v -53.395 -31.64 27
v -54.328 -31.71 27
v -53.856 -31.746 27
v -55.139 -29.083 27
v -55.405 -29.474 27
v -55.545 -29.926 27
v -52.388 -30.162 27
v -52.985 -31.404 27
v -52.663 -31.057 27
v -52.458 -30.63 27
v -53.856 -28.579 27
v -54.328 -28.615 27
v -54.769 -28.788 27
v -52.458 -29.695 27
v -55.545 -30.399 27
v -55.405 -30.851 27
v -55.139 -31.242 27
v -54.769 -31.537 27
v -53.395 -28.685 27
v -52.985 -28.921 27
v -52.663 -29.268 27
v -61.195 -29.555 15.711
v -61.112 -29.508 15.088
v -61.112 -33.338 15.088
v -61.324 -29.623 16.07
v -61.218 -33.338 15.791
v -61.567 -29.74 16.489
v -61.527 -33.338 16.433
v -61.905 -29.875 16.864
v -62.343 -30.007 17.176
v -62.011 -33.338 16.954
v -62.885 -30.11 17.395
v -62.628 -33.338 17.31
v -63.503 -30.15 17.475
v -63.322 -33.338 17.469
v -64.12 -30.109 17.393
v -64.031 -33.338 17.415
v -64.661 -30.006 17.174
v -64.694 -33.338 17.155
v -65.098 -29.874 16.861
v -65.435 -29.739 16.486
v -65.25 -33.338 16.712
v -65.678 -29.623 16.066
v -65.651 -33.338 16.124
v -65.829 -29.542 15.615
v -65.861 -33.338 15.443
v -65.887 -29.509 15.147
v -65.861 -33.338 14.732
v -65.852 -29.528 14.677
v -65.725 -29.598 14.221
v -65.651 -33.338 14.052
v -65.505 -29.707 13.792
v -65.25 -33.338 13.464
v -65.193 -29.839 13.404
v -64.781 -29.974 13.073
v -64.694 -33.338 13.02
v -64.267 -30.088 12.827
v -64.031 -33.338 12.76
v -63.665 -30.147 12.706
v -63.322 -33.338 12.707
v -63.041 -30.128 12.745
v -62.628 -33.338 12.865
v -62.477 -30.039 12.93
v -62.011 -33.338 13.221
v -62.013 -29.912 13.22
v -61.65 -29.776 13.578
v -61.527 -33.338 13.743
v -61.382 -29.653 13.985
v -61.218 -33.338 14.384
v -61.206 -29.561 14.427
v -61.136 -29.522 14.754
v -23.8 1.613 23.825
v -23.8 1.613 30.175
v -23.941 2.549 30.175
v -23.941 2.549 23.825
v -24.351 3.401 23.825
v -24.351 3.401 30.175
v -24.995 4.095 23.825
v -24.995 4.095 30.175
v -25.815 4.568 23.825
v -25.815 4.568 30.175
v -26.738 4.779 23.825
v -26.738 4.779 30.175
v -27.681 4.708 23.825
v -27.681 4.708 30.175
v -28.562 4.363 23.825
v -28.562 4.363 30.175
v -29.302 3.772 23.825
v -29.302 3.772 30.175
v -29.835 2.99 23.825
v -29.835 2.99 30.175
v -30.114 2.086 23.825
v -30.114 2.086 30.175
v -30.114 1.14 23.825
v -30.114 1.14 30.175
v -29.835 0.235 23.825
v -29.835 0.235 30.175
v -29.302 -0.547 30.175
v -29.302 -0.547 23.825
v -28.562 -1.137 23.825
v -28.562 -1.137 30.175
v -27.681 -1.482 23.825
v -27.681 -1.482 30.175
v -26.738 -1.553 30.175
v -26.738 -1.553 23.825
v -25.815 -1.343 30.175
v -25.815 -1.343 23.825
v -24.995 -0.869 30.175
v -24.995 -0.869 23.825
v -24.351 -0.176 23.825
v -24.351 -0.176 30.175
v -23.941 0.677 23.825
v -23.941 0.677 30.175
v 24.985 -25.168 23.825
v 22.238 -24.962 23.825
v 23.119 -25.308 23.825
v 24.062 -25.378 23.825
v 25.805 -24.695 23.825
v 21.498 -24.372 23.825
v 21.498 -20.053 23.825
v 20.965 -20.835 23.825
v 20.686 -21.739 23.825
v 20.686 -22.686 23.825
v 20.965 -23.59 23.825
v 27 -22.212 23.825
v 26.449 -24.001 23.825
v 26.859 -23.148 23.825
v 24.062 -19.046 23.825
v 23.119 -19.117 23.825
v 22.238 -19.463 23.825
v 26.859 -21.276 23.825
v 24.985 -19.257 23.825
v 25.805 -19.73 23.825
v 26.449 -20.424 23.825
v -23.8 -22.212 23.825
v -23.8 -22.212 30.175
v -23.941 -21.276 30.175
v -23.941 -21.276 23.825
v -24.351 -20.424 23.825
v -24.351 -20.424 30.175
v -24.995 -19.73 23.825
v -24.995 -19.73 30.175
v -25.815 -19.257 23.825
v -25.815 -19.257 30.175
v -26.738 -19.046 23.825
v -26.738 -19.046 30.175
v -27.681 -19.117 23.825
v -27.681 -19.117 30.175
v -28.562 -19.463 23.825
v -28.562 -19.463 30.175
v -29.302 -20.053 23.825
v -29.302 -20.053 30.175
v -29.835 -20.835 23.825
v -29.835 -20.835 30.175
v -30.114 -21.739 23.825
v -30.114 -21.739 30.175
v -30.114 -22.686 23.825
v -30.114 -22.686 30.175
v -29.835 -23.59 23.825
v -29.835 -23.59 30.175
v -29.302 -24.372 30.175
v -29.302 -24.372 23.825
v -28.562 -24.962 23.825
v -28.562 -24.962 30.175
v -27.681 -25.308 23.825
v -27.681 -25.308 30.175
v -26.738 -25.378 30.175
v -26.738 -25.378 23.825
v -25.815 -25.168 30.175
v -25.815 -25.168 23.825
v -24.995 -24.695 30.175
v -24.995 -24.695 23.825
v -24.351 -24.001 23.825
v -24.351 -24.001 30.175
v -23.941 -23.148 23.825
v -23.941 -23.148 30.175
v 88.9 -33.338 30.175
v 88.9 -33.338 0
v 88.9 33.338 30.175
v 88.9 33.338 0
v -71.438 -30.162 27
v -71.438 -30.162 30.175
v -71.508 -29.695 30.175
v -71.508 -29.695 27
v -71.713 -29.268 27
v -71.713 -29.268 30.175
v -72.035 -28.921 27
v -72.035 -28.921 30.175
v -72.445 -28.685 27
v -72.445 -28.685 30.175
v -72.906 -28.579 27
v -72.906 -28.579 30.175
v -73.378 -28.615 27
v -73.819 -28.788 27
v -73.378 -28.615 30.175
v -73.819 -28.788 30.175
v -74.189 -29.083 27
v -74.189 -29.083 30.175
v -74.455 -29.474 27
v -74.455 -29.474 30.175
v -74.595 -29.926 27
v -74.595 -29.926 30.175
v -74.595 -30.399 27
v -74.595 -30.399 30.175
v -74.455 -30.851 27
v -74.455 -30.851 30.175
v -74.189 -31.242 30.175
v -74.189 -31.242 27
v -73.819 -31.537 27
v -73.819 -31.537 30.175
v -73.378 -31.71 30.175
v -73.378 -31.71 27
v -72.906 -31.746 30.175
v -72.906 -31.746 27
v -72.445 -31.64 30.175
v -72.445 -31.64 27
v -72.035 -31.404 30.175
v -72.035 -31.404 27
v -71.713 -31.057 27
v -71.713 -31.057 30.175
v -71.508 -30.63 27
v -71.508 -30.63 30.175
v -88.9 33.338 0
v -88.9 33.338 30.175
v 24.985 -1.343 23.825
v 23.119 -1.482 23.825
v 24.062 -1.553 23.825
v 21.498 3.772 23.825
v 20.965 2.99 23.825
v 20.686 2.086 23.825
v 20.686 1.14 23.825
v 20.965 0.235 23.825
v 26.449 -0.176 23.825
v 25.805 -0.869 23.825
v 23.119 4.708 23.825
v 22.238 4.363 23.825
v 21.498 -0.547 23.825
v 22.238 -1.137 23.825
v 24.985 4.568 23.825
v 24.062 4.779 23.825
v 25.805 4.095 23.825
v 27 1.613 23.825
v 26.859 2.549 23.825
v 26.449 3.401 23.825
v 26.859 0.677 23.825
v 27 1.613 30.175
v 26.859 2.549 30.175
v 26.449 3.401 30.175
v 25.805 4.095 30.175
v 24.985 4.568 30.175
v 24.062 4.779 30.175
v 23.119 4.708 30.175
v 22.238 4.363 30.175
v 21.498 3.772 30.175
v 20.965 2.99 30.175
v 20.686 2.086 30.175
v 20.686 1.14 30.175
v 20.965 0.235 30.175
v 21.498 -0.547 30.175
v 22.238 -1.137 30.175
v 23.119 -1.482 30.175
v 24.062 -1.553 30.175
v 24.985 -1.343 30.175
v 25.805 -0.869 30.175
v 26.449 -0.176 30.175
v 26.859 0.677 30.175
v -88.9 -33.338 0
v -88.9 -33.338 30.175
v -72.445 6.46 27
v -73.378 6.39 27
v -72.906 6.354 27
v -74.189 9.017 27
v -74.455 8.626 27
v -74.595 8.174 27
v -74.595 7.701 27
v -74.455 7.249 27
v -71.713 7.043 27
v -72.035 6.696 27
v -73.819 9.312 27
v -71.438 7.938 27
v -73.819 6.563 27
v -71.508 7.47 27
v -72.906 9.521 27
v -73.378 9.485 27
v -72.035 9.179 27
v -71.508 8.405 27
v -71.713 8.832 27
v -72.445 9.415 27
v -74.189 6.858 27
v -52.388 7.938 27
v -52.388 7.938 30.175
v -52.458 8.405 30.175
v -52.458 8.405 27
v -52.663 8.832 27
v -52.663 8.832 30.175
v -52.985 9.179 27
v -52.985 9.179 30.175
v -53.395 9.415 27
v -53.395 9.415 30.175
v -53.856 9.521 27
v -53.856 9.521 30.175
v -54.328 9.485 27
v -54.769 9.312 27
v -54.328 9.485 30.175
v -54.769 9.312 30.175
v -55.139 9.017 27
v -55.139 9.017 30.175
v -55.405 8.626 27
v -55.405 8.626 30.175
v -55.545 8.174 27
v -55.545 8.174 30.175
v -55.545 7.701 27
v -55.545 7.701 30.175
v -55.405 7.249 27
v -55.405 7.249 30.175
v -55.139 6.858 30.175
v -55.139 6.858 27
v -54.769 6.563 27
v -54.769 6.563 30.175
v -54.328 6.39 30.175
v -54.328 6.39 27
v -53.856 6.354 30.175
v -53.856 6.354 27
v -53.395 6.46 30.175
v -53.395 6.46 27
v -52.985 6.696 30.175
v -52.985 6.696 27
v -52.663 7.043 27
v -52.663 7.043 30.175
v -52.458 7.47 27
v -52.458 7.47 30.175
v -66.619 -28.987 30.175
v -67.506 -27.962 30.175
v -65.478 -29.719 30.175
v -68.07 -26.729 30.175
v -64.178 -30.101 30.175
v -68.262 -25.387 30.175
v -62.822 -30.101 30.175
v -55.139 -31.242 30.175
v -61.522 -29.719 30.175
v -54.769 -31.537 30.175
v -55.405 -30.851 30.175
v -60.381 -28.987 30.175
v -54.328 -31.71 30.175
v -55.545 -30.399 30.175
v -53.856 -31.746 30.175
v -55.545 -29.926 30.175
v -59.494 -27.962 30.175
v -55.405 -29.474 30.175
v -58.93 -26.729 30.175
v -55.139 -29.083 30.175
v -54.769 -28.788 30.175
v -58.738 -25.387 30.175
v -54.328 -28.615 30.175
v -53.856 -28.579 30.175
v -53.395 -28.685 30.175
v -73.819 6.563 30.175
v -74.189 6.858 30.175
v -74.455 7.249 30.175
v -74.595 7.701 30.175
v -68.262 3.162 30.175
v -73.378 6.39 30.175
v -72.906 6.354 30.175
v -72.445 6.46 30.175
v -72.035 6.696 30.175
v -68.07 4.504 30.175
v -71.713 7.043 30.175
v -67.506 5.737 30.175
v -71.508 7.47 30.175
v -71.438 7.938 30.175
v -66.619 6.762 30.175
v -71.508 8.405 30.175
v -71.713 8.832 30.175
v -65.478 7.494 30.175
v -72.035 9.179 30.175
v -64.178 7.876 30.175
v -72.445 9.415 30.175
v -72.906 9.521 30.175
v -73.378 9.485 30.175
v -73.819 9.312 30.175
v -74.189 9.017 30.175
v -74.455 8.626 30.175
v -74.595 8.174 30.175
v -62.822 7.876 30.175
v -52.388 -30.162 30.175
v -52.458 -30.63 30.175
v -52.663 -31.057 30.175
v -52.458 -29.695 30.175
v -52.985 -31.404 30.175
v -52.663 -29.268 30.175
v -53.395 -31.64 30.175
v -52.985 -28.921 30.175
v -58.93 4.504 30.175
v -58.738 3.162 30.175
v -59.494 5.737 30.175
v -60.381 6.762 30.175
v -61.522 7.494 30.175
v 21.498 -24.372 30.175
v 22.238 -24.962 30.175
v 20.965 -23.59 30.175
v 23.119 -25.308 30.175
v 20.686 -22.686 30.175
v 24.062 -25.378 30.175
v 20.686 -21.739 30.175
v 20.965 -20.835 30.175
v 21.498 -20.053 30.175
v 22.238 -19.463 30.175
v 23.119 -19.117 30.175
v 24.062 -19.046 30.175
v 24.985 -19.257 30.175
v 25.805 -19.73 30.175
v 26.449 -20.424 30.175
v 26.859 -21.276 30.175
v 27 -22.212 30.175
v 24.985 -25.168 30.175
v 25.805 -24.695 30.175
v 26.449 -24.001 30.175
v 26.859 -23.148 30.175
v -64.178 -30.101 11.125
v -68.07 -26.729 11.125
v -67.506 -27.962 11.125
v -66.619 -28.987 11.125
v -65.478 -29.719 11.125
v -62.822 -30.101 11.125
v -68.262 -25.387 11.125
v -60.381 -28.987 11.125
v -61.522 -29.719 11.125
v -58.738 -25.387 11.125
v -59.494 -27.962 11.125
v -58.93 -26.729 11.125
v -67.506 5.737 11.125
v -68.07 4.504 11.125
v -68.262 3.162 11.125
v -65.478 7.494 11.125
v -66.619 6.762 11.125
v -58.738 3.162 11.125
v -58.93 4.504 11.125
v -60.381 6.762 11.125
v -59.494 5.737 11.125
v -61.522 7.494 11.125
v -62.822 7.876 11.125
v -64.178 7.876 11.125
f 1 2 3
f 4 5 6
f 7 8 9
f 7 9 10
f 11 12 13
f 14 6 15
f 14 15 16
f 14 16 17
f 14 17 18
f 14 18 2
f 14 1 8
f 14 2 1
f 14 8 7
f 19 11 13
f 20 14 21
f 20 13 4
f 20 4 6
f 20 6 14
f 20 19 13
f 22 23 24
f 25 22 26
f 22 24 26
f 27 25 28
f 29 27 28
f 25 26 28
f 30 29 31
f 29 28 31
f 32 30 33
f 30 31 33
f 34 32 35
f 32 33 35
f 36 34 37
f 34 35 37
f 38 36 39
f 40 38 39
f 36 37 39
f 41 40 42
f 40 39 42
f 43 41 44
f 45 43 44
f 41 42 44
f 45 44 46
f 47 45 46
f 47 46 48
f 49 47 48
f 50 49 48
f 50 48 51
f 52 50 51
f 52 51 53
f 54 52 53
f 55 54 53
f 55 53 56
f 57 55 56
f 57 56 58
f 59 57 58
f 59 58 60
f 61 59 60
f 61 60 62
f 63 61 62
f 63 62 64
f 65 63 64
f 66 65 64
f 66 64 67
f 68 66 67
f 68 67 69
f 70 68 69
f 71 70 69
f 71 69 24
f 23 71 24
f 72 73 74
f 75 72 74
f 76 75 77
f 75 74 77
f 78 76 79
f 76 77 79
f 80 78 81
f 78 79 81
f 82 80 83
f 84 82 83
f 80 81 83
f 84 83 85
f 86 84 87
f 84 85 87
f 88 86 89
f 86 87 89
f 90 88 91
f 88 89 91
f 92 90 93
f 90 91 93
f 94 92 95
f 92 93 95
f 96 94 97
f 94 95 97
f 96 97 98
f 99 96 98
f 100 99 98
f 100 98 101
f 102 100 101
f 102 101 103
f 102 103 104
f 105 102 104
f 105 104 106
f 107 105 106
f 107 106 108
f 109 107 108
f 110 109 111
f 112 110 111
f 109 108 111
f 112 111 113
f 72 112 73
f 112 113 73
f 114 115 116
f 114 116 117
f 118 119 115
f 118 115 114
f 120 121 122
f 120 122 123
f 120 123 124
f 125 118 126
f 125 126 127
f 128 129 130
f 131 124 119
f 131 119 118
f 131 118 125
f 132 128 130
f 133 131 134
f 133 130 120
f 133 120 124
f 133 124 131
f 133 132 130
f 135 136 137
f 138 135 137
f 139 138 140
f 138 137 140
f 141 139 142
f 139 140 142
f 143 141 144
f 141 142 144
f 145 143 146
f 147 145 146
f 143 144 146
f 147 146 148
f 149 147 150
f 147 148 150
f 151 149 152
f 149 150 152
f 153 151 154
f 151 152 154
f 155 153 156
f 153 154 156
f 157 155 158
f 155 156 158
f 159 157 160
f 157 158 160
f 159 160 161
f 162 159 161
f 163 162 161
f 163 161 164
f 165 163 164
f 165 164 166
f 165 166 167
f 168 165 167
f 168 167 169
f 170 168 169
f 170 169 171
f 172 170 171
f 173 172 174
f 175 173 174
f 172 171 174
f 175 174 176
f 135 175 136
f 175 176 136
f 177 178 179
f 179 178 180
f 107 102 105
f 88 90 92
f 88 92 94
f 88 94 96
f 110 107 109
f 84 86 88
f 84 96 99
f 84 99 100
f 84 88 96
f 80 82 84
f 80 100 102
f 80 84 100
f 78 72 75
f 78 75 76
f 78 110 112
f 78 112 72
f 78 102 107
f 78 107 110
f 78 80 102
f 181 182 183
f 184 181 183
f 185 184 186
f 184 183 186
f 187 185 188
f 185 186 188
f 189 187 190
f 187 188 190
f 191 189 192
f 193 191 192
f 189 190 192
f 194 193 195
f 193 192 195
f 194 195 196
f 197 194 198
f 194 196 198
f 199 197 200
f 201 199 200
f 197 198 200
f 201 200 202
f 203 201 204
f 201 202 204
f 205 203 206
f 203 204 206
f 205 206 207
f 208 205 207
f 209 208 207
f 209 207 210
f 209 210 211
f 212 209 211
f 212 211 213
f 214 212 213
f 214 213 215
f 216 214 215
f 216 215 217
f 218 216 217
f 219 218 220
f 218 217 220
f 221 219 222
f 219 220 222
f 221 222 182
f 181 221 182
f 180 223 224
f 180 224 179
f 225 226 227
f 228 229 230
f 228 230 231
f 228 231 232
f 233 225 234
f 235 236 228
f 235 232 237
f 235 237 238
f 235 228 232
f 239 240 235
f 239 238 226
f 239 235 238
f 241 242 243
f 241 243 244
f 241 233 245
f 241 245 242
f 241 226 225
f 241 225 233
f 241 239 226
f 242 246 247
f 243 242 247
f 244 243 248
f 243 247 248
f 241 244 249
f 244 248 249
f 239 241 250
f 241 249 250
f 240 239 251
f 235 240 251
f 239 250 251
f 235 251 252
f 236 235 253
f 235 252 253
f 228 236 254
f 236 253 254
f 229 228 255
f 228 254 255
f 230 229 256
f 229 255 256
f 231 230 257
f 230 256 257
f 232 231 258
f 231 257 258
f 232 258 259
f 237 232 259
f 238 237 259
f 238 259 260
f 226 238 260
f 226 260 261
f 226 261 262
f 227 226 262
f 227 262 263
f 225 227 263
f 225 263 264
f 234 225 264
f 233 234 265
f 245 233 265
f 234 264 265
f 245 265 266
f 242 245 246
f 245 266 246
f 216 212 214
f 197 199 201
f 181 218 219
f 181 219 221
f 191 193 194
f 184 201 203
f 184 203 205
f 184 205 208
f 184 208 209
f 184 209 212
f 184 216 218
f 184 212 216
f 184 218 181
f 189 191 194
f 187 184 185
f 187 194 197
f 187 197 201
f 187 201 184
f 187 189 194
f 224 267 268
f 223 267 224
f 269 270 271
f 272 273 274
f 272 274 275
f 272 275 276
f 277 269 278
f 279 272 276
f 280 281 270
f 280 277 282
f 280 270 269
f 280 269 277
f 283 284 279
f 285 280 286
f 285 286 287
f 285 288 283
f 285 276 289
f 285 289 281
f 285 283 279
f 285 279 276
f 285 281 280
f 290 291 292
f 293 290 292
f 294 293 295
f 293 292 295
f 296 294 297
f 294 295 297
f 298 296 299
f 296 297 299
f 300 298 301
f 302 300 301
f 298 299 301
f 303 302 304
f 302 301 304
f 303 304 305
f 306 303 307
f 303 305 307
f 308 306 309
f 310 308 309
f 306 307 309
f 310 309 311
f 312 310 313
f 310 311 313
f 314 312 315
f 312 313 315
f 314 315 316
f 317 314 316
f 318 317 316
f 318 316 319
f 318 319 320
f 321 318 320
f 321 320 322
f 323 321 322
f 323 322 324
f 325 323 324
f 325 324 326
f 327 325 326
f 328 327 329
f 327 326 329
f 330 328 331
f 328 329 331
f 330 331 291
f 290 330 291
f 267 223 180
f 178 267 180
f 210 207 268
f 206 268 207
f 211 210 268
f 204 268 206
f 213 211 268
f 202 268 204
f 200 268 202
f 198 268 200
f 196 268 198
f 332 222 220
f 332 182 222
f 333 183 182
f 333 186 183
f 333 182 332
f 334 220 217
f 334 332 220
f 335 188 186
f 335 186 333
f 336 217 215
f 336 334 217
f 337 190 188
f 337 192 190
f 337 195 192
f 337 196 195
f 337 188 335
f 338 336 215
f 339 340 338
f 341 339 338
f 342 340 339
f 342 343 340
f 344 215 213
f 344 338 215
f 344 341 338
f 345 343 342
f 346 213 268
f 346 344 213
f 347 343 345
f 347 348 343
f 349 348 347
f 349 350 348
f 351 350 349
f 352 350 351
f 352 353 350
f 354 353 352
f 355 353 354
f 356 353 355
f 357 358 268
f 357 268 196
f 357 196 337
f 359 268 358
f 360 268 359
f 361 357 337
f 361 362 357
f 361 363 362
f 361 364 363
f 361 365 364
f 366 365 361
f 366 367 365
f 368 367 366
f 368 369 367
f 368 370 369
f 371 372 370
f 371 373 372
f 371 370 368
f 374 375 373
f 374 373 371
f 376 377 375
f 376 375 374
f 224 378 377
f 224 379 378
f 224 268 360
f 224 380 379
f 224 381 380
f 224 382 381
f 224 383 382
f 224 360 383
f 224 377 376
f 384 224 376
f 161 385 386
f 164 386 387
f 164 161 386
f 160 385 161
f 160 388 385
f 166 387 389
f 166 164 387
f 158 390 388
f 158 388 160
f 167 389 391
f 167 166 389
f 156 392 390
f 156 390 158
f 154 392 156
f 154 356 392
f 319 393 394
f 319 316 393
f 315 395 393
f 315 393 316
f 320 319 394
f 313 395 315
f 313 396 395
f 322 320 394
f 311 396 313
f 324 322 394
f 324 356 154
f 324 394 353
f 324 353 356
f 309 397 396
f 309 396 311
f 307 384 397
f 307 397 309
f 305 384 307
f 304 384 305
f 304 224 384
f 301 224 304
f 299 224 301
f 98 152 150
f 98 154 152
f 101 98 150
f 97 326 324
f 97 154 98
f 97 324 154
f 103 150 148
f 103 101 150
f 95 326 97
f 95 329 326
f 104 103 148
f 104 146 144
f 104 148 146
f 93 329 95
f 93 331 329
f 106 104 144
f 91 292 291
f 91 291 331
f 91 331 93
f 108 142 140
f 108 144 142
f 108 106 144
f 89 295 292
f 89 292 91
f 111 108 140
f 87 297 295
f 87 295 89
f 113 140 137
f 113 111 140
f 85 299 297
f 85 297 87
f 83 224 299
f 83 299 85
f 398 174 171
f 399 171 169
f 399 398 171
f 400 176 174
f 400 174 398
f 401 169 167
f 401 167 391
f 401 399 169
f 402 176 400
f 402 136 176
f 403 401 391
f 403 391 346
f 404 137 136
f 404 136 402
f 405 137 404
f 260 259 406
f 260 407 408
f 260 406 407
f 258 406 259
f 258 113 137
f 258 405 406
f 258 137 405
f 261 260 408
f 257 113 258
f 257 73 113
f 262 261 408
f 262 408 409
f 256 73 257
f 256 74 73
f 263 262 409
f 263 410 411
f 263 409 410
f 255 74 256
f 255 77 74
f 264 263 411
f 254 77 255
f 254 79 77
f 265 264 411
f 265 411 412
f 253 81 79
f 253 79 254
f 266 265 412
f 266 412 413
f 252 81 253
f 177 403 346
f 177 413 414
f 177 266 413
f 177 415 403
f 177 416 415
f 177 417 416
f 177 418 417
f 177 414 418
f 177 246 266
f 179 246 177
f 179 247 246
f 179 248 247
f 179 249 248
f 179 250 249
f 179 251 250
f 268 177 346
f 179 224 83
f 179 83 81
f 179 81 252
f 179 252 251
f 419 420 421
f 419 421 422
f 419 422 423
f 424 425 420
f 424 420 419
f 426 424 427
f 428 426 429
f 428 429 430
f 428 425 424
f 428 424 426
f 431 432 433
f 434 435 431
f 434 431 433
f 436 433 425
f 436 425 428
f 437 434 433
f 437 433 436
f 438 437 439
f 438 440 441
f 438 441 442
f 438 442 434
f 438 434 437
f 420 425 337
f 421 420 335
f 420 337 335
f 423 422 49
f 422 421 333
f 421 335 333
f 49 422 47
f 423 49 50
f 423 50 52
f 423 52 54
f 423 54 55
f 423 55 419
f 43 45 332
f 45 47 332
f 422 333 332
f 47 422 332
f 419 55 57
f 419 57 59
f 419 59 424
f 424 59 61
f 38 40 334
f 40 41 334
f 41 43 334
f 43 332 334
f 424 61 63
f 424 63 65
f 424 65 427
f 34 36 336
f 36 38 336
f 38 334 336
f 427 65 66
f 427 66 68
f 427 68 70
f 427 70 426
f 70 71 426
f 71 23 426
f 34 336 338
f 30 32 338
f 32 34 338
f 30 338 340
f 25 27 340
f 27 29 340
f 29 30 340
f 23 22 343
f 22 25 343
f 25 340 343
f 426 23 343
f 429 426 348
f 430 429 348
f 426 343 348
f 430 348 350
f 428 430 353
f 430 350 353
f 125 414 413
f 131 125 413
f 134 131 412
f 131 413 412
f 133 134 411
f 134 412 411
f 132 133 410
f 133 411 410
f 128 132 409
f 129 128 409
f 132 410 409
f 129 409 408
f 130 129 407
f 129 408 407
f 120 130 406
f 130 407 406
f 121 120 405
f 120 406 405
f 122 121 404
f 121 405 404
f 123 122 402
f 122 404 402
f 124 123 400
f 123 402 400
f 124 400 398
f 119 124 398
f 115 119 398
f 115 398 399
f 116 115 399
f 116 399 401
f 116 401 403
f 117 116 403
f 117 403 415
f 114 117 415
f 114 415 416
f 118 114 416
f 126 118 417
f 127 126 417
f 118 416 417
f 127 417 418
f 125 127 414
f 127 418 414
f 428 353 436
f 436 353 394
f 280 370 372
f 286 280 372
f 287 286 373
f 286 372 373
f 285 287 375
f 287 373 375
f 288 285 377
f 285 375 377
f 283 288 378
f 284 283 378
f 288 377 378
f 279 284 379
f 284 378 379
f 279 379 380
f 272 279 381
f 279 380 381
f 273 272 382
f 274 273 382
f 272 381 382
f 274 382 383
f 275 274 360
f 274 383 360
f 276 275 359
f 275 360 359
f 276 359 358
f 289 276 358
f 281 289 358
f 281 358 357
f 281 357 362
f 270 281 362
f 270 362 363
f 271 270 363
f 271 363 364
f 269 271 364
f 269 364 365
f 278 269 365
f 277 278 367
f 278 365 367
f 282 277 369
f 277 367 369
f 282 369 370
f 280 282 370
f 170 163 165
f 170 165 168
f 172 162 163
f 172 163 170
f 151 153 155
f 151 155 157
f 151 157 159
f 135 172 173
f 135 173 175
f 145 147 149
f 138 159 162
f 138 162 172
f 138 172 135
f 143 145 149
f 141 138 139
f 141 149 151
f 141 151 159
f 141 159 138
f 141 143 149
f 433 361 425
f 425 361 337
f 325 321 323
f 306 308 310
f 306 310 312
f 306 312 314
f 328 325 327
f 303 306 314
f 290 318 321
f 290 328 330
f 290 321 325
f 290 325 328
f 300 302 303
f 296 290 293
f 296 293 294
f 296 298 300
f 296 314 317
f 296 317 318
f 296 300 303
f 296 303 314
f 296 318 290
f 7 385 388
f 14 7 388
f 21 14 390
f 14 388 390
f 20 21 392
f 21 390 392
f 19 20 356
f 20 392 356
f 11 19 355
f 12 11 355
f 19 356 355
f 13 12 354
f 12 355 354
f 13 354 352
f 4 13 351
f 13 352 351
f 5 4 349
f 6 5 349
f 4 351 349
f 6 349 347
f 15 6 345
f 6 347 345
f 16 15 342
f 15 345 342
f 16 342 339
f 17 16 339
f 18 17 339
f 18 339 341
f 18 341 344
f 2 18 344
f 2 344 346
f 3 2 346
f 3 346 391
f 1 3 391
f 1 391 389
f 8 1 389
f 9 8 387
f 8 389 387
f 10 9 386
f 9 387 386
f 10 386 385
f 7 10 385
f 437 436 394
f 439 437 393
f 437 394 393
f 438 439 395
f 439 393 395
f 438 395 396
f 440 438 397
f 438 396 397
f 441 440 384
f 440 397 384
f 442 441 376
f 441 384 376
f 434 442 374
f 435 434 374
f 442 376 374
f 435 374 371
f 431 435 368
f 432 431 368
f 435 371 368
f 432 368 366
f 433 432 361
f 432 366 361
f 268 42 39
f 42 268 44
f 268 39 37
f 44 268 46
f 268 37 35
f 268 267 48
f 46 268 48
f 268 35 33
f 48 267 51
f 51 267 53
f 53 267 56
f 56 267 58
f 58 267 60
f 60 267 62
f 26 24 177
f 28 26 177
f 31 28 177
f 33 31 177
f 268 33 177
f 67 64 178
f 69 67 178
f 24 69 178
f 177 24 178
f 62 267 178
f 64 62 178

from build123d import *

# Parameters (mm, degrees)
F0_W     = 177.8
F0_H     = 66.675
F1_DEPTH = 30.1752
F2_R     = 1.5875
F3_DEPTH = 3.175
F5_DEPTH = 19.05
F6_R     = 3.175
F7_DEPTH = 6.35
F8_R     = 2.3876
F9_DEPTH = 6.35


with BuildPart() as f1:
    # F0 (on Top) → F1 (new body)
    with BuildSketch(Plane.XY):
        Rectangle(F0_W, F0_H)
    extrude(amount=F1_DEPTH)

    # F2 (on face) → F3 (cut)
    with BuildSketch(Plane.XY.offset(30.1752)):
        with Locations((-73.025, 7.9375)):
            Circle(F2_R)
        with Locations((-53.975, 7.9375)):
            Circle(F2_R)
        with Locations((-53.975, -30.1625)):
            Circle(F2_R)
        with Locations((-73.025, -30.1625)):
            Circle(F2_R)
    extrude(amount=-F3_DEPTH, mode=Mode.SUBTRACT)

    # F4 (on face) → F5 (cut)
    with BuildSketch(Plane.XY.offset(30.1752)):
        with BuildLine():
            Line((-58.7375, -25.3873), (-58.7375, 3.1623))
            ThreePointArc((-58.7375, 3.1623), (-63.5, 7.9248), (-68.2625, 3.1623))
            Line((-68.2625, 3.1623), (-68.2625, -25.3873))
            ThreePointArc((-68.2625, -25.3873), (-63.5, -30.1498), (-58.7375, -25.3873))
        make_face()
    extrude(amount=-F5_DEPTH, mode=Mode.SUBTRACT)

    # F6 (on face) → F7 (cut)
    with BuildSketch(Plane.XY.offset(30.1752)):
        with Locations((-26.9748, 1.6129)):
            Circle(F6_R)
        with Locations((23.8252, 1.6129)):
            Circle(F6_R)
        with Locations((23.8252, -22.2123)):
            Circle(F6_R)
        with Locations((-26.9748, -22.2123)):
            Circle(F6_R)
    extrude(amount=-F7_DEPTH, mode=Mode.SUBTRACT)

    # F8 (on face) → F9 (cut)
    with BuildSketch(Plane.XZ.offset(33.3375)):
        with Locations((-63.5, 15.0876)):
            Circle(F8_R)
    extrude(amount=-F9_DEPTH, mode=Mode.SUBTRACT)


solid = f1.part
